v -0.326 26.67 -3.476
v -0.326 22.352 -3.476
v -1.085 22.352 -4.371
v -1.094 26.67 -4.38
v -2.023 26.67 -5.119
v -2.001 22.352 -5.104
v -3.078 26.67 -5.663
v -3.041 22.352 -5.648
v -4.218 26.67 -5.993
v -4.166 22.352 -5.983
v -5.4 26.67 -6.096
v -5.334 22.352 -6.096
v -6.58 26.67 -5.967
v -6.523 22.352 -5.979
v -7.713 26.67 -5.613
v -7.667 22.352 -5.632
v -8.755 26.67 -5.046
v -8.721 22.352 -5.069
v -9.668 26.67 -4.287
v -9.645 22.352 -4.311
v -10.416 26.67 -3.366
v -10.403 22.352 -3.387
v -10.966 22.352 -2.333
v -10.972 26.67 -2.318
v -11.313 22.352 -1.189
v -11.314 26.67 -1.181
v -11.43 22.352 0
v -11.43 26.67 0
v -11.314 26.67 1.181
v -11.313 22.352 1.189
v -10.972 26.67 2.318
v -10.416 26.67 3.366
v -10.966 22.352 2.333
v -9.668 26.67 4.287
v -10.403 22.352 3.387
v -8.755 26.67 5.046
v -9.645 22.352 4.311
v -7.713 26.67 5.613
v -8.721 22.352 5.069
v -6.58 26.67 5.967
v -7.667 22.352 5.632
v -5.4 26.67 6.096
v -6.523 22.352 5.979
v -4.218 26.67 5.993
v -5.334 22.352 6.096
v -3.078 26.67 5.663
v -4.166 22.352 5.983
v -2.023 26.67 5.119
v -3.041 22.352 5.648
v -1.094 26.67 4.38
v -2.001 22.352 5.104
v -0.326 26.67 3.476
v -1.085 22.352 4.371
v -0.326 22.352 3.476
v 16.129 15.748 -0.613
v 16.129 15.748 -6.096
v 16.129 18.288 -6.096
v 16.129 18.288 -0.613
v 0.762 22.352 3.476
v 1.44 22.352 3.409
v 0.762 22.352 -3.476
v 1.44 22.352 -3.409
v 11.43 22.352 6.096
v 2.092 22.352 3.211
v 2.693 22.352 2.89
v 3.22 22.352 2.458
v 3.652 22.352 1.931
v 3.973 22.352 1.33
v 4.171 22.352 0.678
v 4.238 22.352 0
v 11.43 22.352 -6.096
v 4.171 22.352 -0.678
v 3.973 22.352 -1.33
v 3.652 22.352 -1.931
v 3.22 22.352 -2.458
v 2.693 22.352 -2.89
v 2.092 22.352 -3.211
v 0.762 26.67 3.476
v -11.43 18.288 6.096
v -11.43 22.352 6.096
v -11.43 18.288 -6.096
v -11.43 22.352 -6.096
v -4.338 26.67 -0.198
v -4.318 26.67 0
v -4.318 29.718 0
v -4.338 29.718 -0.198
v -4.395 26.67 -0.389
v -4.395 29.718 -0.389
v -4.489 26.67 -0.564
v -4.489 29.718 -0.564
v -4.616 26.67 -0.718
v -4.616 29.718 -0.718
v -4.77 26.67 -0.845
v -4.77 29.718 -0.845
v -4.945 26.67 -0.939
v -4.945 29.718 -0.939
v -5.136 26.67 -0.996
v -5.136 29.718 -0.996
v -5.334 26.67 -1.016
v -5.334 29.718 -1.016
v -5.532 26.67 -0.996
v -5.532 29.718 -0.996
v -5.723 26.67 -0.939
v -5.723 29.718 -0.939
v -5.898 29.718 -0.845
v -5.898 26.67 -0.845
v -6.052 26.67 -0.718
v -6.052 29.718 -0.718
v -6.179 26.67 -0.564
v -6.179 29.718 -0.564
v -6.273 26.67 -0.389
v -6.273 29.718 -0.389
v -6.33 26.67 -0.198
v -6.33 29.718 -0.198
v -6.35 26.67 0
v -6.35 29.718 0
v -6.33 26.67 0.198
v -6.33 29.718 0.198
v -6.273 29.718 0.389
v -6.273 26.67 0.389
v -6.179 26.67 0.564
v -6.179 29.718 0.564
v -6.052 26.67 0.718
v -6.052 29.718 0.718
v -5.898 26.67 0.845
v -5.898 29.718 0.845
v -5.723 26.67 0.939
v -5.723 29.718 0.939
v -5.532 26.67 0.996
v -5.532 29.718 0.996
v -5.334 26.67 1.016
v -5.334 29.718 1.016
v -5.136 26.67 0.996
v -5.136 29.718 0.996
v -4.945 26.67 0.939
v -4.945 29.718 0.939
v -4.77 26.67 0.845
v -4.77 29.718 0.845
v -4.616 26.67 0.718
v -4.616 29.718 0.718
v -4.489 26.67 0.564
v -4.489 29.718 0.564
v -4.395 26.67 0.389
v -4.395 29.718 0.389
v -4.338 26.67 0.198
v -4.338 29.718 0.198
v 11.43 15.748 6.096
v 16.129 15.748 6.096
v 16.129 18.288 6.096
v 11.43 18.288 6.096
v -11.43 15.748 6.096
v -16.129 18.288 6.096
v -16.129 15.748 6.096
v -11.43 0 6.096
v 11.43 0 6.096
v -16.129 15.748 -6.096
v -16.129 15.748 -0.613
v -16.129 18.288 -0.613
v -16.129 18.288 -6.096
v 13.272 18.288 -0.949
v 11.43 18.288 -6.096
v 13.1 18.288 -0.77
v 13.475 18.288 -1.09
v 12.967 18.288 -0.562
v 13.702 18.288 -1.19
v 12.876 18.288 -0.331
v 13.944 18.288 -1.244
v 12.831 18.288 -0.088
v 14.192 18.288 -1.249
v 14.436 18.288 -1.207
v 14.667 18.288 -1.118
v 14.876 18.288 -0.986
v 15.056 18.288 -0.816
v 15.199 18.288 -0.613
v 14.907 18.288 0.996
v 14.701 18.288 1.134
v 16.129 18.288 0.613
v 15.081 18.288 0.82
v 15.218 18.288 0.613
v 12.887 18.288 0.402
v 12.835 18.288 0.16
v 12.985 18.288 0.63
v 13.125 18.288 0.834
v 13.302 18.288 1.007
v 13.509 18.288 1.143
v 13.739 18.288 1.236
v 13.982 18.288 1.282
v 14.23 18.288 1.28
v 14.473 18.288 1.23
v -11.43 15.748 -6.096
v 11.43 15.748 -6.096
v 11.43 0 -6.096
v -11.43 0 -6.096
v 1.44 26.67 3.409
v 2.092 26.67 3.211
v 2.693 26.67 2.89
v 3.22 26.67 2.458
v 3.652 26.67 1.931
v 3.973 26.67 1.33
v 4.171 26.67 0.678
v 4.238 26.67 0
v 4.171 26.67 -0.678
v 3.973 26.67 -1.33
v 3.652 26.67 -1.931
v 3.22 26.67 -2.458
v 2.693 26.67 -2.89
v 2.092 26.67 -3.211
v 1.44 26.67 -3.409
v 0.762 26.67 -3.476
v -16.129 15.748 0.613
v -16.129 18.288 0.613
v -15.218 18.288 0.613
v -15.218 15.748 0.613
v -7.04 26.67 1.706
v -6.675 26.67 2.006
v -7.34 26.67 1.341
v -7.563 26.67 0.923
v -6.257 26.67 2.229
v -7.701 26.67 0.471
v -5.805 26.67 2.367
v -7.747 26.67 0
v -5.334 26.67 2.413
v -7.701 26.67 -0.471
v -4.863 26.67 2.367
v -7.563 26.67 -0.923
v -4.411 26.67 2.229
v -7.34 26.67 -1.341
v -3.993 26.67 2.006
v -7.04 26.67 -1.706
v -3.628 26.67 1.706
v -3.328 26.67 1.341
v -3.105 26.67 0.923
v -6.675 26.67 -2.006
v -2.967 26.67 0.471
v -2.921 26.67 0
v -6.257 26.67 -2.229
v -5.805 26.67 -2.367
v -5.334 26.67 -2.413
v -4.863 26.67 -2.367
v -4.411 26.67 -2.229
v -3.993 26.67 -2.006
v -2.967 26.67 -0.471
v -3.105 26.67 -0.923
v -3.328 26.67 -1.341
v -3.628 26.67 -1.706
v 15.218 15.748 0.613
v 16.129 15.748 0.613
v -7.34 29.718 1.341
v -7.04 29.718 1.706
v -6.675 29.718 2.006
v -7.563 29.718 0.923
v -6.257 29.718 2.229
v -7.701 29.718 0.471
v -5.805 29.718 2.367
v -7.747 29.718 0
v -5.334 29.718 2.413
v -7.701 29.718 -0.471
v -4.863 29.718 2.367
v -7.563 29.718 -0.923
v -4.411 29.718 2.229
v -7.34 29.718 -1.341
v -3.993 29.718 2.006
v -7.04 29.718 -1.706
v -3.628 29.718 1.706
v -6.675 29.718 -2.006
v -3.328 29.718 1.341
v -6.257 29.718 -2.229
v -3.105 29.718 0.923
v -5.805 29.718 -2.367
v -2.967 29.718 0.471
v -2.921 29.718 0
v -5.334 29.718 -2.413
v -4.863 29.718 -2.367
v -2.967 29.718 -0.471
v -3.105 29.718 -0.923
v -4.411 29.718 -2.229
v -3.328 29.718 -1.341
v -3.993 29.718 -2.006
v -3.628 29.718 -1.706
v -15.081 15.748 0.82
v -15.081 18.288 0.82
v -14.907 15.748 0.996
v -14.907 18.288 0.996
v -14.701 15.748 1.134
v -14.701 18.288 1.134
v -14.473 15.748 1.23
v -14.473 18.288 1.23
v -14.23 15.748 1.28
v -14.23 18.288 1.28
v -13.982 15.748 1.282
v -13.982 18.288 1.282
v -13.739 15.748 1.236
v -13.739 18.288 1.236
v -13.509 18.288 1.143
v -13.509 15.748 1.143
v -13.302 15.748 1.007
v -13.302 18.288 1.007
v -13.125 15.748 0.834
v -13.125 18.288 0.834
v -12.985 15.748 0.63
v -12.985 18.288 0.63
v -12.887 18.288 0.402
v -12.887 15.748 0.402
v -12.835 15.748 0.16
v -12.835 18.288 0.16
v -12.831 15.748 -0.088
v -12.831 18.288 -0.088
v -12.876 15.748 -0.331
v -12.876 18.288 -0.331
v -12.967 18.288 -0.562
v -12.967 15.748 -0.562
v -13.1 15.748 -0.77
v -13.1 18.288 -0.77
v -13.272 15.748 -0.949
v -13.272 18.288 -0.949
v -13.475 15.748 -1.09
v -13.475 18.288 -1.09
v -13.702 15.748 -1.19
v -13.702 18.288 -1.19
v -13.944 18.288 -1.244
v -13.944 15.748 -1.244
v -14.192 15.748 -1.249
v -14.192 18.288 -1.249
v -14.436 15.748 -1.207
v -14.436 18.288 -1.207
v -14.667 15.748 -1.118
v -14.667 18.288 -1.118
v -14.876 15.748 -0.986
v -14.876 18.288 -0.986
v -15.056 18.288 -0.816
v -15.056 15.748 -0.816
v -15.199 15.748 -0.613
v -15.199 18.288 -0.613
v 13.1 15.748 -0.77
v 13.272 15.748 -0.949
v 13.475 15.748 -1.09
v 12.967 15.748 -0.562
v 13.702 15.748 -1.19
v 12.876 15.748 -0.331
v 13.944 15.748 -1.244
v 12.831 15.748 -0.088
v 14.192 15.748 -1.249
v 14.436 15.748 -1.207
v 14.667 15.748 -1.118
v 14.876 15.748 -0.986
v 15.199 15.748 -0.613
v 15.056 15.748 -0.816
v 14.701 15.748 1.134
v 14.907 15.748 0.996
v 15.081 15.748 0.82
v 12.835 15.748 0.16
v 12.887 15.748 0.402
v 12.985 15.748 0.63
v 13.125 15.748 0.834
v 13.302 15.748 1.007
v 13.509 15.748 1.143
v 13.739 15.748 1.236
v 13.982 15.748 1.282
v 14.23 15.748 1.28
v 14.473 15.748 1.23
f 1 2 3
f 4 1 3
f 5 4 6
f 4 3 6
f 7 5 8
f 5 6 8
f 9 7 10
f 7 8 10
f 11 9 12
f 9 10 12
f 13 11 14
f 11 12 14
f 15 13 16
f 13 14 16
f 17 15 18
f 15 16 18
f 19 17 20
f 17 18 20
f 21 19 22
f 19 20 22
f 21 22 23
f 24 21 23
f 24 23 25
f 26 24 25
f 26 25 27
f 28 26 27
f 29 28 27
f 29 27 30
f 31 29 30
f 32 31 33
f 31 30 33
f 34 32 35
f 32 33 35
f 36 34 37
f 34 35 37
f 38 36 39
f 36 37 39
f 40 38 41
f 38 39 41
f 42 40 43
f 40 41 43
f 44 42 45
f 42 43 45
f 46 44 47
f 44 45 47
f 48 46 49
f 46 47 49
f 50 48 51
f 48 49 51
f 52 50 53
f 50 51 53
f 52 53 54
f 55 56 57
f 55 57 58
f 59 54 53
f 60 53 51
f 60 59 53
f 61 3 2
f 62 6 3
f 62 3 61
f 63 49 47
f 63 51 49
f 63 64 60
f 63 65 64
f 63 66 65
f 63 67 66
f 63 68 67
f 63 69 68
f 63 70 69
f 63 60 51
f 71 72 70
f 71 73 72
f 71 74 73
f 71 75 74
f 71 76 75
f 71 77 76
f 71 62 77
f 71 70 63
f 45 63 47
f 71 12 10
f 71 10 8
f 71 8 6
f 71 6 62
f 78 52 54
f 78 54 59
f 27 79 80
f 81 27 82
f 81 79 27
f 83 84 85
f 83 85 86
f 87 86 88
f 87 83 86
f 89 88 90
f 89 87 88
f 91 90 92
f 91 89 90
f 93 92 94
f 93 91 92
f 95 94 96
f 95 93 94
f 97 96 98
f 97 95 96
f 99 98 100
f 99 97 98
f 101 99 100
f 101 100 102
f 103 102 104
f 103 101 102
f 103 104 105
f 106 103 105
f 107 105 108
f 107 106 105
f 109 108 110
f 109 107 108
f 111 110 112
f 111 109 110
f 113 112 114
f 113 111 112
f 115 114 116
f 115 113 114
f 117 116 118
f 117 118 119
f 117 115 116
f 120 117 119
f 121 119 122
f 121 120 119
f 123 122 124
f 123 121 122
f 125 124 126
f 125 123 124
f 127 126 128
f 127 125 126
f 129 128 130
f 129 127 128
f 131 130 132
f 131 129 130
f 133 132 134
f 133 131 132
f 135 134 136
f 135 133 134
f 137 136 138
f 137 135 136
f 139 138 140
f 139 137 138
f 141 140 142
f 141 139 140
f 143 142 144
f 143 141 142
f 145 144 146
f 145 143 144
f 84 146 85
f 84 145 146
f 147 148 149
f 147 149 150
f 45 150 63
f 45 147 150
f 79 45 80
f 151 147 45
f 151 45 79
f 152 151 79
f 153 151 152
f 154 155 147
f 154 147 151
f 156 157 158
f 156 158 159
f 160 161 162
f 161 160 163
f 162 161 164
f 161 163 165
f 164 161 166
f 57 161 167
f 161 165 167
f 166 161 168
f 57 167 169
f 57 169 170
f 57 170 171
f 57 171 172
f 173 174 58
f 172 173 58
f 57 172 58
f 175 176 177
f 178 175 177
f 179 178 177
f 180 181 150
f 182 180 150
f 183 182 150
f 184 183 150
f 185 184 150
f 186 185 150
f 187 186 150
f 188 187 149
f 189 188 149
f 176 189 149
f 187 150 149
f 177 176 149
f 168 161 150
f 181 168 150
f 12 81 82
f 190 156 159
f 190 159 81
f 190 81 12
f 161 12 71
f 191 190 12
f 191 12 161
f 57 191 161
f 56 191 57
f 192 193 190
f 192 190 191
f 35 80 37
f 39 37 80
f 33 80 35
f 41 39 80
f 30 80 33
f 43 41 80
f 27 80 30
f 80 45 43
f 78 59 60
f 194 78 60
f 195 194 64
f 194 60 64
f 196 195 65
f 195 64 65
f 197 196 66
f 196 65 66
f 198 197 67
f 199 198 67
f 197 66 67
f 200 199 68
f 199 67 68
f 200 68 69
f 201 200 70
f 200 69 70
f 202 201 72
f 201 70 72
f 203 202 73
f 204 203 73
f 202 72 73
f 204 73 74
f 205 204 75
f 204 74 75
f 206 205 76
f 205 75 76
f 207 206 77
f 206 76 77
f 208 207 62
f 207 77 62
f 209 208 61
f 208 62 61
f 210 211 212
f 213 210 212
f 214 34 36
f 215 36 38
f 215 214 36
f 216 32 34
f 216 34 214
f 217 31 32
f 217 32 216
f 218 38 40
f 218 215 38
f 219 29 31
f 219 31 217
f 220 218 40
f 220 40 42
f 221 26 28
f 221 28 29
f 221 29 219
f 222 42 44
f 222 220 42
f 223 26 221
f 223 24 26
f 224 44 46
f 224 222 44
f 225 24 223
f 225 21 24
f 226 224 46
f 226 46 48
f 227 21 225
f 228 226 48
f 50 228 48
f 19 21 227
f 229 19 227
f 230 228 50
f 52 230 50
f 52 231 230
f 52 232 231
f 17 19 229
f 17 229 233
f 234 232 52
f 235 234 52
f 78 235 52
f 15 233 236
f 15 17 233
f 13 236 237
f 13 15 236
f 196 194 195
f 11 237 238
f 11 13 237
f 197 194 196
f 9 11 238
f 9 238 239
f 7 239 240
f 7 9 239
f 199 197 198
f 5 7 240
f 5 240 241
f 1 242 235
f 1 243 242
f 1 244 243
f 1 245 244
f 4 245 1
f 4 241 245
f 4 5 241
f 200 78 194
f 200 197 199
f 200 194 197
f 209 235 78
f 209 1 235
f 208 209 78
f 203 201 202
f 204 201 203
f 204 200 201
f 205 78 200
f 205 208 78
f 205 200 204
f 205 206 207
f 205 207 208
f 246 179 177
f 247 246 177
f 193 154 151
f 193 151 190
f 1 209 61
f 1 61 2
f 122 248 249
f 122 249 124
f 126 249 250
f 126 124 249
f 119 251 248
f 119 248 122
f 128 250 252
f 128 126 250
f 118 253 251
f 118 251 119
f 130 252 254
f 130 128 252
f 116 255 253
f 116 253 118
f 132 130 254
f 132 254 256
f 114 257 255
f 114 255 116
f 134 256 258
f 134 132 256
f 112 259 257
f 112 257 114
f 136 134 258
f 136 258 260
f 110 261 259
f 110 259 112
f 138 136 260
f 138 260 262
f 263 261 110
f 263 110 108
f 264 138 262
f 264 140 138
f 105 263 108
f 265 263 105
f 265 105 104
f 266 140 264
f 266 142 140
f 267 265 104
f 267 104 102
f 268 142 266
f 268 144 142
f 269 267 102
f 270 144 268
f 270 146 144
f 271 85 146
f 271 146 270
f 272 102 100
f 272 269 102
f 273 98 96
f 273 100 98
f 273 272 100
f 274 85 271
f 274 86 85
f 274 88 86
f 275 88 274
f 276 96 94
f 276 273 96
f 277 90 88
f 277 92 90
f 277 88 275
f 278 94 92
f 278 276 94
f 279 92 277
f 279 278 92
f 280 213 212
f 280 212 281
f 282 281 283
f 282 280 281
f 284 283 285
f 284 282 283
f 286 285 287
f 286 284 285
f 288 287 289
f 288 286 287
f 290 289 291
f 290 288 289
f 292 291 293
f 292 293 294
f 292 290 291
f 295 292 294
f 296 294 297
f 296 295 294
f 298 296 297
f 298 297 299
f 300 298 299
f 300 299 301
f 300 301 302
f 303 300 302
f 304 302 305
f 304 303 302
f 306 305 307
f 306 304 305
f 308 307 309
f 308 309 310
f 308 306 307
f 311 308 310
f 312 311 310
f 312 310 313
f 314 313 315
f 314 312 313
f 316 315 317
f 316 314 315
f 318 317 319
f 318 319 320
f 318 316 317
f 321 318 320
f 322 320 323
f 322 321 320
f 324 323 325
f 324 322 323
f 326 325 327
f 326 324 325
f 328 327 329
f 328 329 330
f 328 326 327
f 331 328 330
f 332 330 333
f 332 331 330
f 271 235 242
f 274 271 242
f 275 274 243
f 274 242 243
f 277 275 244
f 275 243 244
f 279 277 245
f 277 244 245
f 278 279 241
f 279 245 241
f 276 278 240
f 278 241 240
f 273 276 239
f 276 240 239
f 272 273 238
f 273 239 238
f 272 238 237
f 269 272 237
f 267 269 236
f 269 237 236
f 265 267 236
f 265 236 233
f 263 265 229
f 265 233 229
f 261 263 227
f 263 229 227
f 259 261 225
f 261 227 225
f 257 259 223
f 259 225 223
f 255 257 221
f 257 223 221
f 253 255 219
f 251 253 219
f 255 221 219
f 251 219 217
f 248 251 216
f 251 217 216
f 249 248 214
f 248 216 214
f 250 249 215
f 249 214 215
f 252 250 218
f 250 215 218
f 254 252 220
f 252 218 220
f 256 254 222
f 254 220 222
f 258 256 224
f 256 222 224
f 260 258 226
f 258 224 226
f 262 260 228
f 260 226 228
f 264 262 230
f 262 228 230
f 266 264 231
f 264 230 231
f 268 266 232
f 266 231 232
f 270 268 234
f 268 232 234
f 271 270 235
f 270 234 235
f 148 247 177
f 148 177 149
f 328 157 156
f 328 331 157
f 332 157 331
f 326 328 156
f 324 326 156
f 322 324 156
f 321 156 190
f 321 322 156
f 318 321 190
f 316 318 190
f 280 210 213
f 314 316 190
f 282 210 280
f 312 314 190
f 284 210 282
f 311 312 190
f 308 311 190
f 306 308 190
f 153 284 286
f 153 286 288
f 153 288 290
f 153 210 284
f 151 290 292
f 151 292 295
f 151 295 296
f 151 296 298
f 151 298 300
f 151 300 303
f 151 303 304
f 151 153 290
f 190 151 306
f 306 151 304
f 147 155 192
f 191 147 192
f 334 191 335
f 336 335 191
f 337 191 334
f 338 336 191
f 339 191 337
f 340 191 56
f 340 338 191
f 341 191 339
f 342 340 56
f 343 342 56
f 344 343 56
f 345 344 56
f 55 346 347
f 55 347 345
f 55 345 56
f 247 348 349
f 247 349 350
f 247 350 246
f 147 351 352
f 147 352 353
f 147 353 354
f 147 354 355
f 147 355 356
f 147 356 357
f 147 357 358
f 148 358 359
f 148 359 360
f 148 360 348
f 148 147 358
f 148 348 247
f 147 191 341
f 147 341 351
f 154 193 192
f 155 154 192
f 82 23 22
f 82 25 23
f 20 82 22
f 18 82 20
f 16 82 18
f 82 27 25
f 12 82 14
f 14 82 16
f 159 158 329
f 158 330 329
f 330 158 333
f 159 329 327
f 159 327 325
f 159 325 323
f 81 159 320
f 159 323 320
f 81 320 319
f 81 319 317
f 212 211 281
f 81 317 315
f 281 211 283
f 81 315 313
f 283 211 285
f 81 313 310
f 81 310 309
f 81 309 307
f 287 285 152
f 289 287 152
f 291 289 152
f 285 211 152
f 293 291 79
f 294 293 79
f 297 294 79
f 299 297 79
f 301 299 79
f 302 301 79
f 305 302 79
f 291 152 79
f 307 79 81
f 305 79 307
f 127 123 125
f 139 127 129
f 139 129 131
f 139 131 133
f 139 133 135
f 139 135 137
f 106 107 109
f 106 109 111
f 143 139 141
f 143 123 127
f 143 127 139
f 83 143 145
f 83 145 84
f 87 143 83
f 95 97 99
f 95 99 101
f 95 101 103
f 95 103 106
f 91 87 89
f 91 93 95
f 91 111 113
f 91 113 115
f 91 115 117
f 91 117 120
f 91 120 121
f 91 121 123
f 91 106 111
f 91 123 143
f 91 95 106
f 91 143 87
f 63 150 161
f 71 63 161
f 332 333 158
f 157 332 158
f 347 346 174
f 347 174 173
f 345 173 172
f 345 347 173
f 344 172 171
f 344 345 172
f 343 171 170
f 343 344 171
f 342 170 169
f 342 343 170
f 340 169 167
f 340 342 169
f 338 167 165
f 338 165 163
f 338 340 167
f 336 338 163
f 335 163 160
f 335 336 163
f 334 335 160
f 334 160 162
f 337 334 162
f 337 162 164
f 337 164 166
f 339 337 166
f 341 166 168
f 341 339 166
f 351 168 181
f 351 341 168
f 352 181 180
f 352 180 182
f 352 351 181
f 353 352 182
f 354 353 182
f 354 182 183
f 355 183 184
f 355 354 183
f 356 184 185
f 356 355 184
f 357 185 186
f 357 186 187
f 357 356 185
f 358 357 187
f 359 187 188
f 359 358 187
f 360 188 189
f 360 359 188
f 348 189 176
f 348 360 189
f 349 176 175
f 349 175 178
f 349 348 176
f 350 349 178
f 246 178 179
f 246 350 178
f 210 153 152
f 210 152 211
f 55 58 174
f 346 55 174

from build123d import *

# Parameters (mm, degrees)
SKETCH1_W           = 22.86
SKETCH1_H           = 12.192
BOSS_EXTRUDE1_DEPTH = 22.352
BOSS_EXTRUDE2_DEPTH = 4.318
BOSS_EXTRUDE3_START = -15.748
BOSS_EXTRUDE3_DEPTH = 2.54
SKETCH4_R           = 2.413
SKETCH4_R_2         = 1.016
BOSS_EXTRUDE4_DEPTH = 3.048


with BuildPart() as part:
    # Sketch1 → Boss-Extrude1 (new body)
    with BuildSketch(Plane(origin=(0, 0, 0), x_dir=(1, 0, 0), z_dir=(0, 1, 0))):
        Rectangle(SKETCH1_W, SKETCH1_H)
    extrude(amount=BOSS_EXTRUDE1_DEPTH)

    # Sketch2 → Boss-Extrude2 (add)
    with BuildSketch(Plane(origin=(0, 22.352, 0), x_dir=(1, 0, 0), z_dir=(0, 1, 0))):
        with BuildLine():
            Line((0.762, 3.475776023), (-0.325986717, 3.475776023))
            ThreePointArc((-0.325986717, 3.475776023), (-11.43, 0), (-0.325986717, -3.475776023))
            Line((-0.325986717, -3.475776023), (0.762, -3.475776023))
            ThreePointArc((0.762, -3.475776023), (4.237776023, 0), (0.762, 3.475776023))
        make_face()
    extrude(amount=BOSS_EXTRUDE2_DEPTH)

    # Sketch3 → Boss-Extrude3 (add)
    with BuildSketch(Plane.XZ.offset(BOSS_EXTRUDE3_START)):
        with BuildLine():
            Line((-16.129, -6.096), (16.129, -6.096))
            Line((16.129, -6.096), (16.129, -0.613485199))
            Line((16.129, -0.613485199), (15.199445863, -0.613485199))
            ThreePointArc((15.199445863, -0.613485199), (12.827148451, 0.036418828), (15.218207768, 0.613485199))
            Line((15.218207768, 0.613485199), (16.129, 0.613485199))
            Line((16.129, 0.613485199), (16.129, 6.096))
            Line((16.129, 6.096), (-16.129, 6.096))
            Line((-16.129, 6.096), (-16.129, 0.613485199))
            Line((-16.129, 0.613485199), (-15.218207768, 0.613485199))
            ThreePointArc((-15.218207768, 0.613485199), (-12.827148451, 0.036418828), (-15.199445863, -0.613485199))
            Line((-15.199445863, -0.613485199), (-16.129, -0.613485199))
            Line((-16.129, -0.613485199), (-16.129, -6.096))
        make_face()
    extrude(amount=-BOSS_EXTRUDE3_DEPTH)

    # Sketch4 → Boss-Extrude4 (add)
    with BuildSketch(Plane(origin=(0, 26.67, 0), x_dir=(1, 0, 0), z_dir=(0, 1, 0))):
        with Locations((-5.334, 0)):
            Circle(SKETCH4_R)
        with Locations((-5.334, 0)):
            Circle(SKETCH4_R_2, mode=Mode.SUBTRACT)
    extrude(amount=BOSS_EXTRUDE4_DEPTH)


solid = part.part
